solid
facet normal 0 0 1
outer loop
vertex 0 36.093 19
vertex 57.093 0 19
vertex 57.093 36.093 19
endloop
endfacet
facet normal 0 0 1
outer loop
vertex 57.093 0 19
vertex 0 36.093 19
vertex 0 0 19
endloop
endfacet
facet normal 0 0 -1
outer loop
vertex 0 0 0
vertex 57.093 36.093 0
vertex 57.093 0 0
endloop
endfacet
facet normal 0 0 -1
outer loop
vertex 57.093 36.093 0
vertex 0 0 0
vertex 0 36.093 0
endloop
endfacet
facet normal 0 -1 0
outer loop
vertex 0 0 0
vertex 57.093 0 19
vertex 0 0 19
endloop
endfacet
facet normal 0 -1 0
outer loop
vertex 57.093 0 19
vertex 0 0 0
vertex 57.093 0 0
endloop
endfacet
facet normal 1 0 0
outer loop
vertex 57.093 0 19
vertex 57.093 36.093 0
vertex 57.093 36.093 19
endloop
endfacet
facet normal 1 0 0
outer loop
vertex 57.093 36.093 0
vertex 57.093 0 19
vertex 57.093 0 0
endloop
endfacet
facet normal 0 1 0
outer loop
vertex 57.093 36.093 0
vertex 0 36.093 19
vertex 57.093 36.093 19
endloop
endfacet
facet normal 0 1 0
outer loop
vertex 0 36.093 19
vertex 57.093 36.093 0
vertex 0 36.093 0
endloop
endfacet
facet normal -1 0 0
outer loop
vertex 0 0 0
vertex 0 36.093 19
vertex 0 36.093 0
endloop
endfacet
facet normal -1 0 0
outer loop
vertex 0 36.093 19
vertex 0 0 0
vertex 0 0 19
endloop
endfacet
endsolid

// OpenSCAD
cube([57.09336, 36.09336, 19]);
translate([1.207, 2.042, 0])
    linear_extrude(height = 23.56, convexity = 5)
        import(file = "vdroite.dxf", layer = "0");
